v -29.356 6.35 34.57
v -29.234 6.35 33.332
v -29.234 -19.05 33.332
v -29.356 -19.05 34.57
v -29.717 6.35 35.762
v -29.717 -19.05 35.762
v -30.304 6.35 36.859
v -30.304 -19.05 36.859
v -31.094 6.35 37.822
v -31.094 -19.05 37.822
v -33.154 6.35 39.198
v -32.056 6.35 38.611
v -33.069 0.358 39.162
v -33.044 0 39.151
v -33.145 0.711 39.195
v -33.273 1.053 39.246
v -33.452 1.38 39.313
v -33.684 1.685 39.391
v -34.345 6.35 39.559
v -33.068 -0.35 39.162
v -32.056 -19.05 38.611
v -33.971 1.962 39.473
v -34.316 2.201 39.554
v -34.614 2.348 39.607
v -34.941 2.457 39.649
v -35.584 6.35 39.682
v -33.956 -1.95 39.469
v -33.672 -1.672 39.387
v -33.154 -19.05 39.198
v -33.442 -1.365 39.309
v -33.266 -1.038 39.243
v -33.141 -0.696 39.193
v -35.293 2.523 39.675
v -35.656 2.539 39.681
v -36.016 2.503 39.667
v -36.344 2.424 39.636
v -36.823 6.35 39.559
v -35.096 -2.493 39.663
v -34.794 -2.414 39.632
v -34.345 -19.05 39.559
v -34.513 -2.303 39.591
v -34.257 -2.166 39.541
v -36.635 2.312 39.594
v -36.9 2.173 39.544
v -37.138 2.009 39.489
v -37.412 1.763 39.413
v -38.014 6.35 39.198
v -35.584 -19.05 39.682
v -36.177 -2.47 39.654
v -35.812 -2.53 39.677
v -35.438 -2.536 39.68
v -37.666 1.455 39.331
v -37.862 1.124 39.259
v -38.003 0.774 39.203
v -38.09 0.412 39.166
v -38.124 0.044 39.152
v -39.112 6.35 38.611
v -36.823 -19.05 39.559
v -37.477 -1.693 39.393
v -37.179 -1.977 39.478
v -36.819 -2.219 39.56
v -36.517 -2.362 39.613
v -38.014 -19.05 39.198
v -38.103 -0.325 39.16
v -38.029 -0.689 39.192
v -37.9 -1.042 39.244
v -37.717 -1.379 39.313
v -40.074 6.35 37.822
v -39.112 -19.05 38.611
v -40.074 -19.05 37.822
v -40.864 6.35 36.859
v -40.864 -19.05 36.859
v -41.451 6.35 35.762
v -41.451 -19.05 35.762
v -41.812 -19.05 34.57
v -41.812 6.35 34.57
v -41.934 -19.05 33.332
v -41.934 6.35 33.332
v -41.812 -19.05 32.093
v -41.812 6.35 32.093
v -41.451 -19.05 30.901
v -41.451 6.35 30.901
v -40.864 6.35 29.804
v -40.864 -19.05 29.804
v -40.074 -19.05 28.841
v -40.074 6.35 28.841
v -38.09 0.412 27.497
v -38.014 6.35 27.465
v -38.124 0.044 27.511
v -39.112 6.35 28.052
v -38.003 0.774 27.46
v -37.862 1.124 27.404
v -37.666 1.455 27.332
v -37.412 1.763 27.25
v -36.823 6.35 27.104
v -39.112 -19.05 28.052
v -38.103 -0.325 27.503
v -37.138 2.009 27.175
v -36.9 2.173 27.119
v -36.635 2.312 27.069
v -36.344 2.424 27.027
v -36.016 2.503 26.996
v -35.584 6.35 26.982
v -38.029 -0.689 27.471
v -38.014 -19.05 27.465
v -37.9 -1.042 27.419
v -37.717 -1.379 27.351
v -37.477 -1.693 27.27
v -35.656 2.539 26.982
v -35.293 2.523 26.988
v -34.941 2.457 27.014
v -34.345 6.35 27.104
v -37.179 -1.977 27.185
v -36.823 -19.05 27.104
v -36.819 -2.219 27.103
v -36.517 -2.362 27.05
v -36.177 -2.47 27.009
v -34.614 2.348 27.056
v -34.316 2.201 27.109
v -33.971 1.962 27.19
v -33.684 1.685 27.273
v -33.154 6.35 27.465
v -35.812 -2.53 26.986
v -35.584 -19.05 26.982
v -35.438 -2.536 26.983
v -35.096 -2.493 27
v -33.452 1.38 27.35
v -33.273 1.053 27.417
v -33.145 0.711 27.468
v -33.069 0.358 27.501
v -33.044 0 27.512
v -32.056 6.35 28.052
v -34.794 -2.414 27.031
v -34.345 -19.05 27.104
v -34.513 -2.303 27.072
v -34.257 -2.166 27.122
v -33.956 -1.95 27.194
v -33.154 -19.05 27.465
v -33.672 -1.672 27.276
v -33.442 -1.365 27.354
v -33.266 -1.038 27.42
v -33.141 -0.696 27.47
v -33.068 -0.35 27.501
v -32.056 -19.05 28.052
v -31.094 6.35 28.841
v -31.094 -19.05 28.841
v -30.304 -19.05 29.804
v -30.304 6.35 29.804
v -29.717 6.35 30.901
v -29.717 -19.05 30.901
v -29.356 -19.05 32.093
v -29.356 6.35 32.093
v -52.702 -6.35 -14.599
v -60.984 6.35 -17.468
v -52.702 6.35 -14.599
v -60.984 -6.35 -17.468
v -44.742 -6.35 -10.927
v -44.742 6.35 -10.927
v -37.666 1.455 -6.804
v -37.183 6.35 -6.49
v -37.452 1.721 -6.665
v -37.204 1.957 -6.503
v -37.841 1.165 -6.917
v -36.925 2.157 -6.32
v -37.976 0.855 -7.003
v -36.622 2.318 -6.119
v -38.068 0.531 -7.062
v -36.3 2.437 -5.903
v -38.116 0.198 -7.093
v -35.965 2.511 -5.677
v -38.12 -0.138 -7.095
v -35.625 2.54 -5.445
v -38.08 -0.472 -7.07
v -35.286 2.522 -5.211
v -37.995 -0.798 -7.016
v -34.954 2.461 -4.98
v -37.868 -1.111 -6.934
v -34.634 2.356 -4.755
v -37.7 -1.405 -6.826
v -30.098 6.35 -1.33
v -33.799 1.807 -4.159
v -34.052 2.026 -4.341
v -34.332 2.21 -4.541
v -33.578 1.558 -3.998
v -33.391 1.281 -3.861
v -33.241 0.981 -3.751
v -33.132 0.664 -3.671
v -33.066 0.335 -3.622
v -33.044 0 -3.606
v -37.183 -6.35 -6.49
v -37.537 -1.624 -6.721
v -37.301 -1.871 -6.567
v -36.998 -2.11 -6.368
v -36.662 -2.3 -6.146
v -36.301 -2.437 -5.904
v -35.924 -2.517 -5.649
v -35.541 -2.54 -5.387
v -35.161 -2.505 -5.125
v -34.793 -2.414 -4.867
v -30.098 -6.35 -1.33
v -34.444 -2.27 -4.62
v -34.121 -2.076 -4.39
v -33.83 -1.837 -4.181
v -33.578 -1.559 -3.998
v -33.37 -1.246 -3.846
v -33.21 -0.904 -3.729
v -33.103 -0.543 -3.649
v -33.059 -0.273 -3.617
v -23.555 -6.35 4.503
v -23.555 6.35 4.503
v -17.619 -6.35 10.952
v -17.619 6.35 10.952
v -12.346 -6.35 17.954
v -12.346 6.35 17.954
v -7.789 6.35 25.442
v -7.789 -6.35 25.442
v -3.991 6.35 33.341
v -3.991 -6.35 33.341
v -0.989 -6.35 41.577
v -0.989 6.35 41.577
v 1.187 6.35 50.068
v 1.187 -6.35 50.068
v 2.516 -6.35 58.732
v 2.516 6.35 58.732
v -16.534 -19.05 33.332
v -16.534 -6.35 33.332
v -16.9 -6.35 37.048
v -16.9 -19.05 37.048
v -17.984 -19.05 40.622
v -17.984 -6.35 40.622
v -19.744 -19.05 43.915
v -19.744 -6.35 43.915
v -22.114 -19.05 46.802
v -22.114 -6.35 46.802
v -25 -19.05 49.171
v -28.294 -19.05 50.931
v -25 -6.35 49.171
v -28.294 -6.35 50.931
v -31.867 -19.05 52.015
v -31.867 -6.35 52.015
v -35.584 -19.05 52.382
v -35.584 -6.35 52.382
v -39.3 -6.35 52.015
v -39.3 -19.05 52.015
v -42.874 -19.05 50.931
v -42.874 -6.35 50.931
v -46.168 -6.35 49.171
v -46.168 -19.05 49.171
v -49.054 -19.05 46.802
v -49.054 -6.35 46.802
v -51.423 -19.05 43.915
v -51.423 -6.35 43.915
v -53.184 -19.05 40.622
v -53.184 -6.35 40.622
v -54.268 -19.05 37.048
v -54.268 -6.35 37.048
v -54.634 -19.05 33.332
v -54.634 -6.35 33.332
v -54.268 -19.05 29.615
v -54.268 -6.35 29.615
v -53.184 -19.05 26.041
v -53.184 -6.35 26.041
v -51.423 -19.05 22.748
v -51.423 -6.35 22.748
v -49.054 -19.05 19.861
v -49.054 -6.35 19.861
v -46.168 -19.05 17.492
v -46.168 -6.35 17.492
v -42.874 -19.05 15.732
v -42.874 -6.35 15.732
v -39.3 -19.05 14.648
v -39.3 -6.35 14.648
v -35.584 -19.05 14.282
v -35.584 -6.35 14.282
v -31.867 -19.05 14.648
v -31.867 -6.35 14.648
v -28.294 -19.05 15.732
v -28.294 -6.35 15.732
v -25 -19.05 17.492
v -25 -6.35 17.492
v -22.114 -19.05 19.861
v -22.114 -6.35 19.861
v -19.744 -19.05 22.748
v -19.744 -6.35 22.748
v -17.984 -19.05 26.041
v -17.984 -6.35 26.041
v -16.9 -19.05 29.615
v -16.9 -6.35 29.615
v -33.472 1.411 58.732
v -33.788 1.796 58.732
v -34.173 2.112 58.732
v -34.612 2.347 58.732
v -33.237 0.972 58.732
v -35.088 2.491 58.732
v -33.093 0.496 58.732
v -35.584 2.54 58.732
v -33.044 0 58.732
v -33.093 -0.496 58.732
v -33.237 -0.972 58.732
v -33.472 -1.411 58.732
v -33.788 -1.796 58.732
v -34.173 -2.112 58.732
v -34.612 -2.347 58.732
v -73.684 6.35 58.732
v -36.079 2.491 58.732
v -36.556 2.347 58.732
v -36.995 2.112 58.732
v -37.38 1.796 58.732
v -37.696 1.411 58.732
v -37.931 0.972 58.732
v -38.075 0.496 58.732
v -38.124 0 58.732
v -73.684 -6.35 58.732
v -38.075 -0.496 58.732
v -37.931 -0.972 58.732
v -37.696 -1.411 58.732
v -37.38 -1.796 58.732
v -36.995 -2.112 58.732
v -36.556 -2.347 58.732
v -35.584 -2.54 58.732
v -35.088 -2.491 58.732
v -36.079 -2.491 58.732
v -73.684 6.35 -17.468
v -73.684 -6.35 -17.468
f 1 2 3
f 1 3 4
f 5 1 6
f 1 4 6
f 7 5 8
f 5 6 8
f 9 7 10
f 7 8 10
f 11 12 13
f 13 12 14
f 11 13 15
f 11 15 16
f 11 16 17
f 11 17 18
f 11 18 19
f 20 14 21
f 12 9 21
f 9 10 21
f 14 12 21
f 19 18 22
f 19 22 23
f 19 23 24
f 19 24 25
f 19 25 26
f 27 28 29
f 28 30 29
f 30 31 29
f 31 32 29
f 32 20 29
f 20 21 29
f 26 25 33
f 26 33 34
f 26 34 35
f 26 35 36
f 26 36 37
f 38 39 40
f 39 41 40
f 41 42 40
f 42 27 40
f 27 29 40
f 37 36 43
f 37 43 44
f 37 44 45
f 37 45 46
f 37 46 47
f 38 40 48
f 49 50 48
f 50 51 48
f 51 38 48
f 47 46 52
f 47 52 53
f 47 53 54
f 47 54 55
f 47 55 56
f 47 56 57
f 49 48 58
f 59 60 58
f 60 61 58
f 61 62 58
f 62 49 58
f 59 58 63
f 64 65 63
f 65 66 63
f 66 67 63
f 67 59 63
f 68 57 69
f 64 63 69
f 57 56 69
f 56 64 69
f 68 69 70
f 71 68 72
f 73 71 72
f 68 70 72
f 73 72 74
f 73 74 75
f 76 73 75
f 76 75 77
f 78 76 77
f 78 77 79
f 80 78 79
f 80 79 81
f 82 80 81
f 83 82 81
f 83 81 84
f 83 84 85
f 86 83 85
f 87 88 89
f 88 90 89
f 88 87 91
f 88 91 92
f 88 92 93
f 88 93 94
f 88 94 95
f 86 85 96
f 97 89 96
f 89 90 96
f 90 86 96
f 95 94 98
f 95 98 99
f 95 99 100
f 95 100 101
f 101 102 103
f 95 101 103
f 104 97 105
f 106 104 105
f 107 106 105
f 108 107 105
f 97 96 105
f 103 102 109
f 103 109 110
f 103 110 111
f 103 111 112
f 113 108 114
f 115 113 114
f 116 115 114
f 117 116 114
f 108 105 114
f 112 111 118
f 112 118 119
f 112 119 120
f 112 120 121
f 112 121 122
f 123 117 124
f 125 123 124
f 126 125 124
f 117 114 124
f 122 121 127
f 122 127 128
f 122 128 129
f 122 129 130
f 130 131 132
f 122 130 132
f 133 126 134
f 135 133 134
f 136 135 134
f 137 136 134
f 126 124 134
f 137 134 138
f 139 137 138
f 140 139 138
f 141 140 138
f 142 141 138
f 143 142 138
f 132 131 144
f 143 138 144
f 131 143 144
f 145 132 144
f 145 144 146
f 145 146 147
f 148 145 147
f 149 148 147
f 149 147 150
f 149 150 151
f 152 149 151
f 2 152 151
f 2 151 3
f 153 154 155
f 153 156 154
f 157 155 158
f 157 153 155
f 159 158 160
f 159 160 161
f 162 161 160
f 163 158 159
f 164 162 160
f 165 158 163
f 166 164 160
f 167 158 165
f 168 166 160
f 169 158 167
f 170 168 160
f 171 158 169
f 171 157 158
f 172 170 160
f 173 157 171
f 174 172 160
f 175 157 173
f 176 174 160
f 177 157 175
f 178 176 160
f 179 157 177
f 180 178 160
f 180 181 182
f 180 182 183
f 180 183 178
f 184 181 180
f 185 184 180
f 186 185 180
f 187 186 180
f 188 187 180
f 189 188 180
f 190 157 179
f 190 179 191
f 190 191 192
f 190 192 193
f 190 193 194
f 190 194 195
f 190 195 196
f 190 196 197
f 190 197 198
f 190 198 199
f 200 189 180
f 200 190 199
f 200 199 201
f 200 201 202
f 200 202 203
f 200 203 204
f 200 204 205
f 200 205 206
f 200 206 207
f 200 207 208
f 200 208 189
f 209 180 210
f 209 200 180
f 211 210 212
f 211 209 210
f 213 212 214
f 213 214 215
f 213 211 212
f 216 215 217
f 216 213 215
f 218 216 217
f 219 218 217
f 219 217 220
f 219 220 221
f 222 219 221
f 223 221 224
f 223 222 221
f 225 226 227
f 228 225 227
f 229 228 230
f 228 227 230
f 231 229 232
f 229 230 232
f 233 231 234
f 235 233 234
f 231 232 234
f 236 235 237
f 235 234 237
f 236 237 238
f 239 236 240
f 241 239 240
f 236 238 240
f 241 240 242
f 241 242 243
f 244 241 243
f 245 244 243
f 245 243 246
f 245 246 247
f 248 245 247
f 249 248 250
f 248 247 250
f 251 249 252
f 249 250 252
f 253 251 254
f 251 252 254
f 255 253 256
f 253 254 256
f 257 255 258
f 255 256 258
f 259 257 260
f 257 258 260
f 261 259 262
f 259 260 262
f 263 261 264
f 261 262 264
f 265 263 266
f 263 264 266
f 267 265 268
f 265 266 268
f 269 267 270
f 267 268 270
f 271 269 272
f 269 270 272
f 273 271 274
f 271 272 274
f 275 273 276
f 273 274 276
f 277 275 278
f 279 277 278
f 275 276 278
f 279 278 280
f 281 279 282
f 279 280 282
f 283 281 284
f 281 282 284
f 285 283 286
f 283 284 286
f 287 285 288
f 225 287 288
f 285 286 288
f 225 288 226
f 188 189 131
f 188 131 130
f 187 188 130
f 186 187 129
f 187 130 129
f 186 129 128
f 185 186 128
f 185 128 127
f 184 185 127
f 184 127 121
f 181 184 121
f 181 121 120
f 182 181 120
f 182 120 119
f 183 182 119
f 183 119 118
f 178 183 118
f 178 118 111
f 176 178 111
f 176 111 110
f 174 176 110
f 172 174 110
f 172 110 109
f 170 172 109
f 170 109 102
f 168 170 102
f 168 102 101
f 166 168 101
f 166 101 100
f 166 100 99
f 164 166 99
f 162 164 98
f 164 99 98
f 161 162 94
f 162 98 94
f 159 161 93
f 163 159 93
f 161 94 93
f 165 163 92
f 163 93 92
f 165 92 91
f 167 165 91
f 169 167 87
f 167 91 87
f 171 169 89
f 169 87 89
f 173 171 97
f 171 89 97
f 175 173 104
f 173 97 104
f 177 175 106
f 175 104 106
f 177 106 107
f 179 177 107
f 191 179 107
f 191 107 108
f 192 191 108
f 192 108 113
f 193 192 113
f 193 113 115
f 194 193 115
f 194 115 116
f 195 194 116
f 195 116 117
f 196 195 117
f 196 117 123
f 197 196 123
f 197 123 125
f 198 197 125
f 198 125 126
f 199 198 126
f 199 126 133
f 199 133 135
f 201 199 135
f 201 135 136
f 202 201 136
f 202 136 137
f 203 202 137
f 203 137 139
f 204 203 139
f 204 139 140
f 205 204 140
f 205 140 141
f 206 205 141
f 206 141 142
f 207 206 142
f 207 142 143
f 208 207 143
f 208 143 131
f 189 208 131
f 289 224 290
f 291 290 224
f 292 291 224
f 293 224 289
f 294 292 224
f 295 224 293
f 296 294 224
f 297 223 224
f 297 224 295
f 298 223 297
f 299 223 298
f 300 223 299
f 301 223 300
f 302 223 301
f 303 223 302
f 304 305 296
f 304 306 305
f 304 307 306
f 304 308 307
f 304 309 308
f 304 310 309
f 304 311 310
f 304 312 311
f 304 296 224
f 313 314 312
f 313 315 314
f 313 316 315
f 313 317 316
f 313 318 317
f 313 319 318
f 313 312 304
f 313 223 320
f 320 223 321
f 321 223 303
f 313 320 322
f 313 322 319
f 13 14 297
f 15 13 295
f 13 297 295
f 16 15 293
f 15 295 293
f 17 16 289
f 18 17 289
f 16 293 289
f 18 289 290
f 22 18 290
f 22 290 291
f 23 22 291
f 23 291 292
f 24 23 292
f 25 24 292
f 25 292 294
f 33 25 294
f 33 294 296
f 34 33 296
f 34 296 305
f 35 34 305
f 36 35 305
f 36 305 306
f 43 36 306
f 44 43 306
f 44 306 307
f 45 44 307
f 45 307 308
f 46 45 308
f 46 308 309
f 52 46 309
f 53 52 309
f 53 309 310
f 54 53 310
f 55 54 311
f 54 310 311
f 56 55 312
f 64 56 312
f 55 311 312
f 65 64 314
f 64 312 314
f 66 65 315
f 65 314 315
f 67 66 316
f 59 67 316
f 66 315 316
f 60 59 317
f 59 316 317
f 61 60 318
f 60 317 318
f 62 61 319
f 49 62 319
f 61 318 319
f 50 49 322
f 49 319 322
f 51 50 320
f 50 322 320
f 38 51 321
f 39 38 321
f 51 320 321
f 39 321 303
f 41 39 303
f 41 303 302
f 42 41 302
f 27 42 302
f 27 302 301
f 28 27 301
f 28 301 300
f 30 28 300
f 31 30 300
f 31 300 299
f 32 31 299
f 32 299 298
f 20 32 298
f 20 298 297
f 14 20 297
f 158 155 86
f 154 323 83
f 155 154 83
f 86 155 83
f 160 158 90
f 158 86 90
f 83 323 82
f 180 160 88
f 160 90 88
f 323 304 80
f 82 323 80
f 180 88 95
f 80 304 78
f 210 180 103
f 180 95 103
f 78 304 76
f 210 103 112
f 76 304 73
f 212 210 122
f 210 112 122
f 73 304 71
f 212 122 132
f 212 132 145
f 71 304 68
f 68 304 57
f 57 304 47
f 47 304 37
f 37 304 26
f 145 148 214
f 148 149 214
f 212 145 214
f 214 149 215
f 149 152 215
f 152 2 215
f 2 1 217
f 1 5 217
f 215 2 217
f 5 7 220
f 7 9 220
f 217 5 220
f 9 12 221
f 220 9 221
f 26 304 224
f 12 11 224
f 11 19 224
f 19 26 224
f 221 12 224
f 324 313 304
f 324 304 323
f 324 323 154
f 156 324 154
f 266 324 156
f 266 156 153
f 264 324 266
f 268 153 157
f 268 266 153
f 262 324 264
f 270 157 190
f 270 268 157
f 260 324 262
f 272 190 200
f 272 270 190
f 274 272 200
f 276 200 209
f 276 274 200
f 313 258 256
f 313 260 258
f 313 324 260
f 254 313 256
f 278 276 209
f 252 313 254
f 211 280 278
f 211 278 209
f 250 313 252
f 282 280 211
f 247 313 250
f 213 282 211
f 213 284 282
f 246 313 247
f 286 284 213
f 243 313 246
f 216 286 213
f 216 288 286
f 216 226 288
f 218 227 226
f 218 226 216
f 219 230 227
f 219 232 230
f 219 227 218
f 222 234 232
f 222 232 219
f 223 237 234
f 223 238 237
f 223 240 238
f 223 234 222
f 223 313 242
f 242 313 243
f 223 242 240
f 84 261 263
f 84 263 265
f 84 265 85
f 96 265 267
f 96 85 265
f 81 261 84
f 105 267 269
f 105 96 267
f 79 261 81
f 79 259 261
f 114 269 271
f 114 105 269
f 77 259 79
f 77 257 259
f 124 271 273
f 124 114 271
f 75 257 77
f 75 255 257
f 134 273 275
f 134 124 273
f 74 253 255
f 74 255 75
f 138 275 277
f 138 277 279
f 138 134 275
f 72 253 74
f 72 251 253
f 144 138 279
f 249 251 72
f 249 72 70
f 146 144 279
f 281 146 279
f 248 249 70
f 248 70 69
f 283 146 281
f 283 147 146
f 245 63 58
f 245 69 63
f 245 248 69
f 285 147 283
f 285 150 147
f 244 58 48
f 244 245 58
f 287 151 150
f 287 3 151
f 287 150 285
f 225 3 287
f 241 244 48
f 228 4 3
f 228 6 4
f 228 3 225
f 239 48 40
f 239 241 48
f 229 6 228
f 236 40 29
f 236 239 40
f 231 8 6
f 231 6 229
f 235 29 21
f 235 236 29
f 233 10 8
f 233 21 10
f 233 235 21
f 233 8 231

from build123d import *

# Parameters (mm, degrees)
F1_DEPTH = 6.35
F2_R     = 19.05
F3_DEPTH = 12.7
F4_R     = 6.35
F5_DEPTH = 74.422
F6_R     = 2.54
F7_DEPTH = 76.201


with BuildPart() as f1:
    # F0 (on Front) → F1 (new body, symmetric)
    with BuildSketch(Plane.XZ):
        with BuildLine():
            Line((2.516038, 58.73151), (-73.683962, 58.73151))
            Line((-73.683962, 58.73151), (-73.683962, -17.46849))
            Line((-73.683962, -17.46849), (-60.983962, -17.46849))
            ThreePointArc((-60.983962, -17.46849), (-17.618712, 10.952135), (2.516038, 58.73151))
        make_face()
    extrude(amount=F1_DEPTH, both=True)

    # F2 (on face) → F3 (join)
    with BuildSketch(Plane.XZ.offset(6.35)):
        with Locations((-35.583962, 33.33151)):
            Circle(F2_R)
    extrude(amount=F3_DEPTH)

    # F4 (on face) → F5 (cut)
    with BuildSketch(Plane.XZ.offset(19.05)):
        with Locations((-35.583962, 33.33151)):
            Circle(F4_R)
    extrude(amount=-F5_DEPTH, mode=Mode.SUBTRACT)

    # F6 (on face) → F7 (cut, through all)
    with BuildSketch(Plane.XY.offset(58.73151)):
        with Locations((-35.583962, 0)):
            Circle(F6_R)
    extrude(amount=-F7_DEPTH, mode=Mode.SUBTRACT)


solid = f1.part
